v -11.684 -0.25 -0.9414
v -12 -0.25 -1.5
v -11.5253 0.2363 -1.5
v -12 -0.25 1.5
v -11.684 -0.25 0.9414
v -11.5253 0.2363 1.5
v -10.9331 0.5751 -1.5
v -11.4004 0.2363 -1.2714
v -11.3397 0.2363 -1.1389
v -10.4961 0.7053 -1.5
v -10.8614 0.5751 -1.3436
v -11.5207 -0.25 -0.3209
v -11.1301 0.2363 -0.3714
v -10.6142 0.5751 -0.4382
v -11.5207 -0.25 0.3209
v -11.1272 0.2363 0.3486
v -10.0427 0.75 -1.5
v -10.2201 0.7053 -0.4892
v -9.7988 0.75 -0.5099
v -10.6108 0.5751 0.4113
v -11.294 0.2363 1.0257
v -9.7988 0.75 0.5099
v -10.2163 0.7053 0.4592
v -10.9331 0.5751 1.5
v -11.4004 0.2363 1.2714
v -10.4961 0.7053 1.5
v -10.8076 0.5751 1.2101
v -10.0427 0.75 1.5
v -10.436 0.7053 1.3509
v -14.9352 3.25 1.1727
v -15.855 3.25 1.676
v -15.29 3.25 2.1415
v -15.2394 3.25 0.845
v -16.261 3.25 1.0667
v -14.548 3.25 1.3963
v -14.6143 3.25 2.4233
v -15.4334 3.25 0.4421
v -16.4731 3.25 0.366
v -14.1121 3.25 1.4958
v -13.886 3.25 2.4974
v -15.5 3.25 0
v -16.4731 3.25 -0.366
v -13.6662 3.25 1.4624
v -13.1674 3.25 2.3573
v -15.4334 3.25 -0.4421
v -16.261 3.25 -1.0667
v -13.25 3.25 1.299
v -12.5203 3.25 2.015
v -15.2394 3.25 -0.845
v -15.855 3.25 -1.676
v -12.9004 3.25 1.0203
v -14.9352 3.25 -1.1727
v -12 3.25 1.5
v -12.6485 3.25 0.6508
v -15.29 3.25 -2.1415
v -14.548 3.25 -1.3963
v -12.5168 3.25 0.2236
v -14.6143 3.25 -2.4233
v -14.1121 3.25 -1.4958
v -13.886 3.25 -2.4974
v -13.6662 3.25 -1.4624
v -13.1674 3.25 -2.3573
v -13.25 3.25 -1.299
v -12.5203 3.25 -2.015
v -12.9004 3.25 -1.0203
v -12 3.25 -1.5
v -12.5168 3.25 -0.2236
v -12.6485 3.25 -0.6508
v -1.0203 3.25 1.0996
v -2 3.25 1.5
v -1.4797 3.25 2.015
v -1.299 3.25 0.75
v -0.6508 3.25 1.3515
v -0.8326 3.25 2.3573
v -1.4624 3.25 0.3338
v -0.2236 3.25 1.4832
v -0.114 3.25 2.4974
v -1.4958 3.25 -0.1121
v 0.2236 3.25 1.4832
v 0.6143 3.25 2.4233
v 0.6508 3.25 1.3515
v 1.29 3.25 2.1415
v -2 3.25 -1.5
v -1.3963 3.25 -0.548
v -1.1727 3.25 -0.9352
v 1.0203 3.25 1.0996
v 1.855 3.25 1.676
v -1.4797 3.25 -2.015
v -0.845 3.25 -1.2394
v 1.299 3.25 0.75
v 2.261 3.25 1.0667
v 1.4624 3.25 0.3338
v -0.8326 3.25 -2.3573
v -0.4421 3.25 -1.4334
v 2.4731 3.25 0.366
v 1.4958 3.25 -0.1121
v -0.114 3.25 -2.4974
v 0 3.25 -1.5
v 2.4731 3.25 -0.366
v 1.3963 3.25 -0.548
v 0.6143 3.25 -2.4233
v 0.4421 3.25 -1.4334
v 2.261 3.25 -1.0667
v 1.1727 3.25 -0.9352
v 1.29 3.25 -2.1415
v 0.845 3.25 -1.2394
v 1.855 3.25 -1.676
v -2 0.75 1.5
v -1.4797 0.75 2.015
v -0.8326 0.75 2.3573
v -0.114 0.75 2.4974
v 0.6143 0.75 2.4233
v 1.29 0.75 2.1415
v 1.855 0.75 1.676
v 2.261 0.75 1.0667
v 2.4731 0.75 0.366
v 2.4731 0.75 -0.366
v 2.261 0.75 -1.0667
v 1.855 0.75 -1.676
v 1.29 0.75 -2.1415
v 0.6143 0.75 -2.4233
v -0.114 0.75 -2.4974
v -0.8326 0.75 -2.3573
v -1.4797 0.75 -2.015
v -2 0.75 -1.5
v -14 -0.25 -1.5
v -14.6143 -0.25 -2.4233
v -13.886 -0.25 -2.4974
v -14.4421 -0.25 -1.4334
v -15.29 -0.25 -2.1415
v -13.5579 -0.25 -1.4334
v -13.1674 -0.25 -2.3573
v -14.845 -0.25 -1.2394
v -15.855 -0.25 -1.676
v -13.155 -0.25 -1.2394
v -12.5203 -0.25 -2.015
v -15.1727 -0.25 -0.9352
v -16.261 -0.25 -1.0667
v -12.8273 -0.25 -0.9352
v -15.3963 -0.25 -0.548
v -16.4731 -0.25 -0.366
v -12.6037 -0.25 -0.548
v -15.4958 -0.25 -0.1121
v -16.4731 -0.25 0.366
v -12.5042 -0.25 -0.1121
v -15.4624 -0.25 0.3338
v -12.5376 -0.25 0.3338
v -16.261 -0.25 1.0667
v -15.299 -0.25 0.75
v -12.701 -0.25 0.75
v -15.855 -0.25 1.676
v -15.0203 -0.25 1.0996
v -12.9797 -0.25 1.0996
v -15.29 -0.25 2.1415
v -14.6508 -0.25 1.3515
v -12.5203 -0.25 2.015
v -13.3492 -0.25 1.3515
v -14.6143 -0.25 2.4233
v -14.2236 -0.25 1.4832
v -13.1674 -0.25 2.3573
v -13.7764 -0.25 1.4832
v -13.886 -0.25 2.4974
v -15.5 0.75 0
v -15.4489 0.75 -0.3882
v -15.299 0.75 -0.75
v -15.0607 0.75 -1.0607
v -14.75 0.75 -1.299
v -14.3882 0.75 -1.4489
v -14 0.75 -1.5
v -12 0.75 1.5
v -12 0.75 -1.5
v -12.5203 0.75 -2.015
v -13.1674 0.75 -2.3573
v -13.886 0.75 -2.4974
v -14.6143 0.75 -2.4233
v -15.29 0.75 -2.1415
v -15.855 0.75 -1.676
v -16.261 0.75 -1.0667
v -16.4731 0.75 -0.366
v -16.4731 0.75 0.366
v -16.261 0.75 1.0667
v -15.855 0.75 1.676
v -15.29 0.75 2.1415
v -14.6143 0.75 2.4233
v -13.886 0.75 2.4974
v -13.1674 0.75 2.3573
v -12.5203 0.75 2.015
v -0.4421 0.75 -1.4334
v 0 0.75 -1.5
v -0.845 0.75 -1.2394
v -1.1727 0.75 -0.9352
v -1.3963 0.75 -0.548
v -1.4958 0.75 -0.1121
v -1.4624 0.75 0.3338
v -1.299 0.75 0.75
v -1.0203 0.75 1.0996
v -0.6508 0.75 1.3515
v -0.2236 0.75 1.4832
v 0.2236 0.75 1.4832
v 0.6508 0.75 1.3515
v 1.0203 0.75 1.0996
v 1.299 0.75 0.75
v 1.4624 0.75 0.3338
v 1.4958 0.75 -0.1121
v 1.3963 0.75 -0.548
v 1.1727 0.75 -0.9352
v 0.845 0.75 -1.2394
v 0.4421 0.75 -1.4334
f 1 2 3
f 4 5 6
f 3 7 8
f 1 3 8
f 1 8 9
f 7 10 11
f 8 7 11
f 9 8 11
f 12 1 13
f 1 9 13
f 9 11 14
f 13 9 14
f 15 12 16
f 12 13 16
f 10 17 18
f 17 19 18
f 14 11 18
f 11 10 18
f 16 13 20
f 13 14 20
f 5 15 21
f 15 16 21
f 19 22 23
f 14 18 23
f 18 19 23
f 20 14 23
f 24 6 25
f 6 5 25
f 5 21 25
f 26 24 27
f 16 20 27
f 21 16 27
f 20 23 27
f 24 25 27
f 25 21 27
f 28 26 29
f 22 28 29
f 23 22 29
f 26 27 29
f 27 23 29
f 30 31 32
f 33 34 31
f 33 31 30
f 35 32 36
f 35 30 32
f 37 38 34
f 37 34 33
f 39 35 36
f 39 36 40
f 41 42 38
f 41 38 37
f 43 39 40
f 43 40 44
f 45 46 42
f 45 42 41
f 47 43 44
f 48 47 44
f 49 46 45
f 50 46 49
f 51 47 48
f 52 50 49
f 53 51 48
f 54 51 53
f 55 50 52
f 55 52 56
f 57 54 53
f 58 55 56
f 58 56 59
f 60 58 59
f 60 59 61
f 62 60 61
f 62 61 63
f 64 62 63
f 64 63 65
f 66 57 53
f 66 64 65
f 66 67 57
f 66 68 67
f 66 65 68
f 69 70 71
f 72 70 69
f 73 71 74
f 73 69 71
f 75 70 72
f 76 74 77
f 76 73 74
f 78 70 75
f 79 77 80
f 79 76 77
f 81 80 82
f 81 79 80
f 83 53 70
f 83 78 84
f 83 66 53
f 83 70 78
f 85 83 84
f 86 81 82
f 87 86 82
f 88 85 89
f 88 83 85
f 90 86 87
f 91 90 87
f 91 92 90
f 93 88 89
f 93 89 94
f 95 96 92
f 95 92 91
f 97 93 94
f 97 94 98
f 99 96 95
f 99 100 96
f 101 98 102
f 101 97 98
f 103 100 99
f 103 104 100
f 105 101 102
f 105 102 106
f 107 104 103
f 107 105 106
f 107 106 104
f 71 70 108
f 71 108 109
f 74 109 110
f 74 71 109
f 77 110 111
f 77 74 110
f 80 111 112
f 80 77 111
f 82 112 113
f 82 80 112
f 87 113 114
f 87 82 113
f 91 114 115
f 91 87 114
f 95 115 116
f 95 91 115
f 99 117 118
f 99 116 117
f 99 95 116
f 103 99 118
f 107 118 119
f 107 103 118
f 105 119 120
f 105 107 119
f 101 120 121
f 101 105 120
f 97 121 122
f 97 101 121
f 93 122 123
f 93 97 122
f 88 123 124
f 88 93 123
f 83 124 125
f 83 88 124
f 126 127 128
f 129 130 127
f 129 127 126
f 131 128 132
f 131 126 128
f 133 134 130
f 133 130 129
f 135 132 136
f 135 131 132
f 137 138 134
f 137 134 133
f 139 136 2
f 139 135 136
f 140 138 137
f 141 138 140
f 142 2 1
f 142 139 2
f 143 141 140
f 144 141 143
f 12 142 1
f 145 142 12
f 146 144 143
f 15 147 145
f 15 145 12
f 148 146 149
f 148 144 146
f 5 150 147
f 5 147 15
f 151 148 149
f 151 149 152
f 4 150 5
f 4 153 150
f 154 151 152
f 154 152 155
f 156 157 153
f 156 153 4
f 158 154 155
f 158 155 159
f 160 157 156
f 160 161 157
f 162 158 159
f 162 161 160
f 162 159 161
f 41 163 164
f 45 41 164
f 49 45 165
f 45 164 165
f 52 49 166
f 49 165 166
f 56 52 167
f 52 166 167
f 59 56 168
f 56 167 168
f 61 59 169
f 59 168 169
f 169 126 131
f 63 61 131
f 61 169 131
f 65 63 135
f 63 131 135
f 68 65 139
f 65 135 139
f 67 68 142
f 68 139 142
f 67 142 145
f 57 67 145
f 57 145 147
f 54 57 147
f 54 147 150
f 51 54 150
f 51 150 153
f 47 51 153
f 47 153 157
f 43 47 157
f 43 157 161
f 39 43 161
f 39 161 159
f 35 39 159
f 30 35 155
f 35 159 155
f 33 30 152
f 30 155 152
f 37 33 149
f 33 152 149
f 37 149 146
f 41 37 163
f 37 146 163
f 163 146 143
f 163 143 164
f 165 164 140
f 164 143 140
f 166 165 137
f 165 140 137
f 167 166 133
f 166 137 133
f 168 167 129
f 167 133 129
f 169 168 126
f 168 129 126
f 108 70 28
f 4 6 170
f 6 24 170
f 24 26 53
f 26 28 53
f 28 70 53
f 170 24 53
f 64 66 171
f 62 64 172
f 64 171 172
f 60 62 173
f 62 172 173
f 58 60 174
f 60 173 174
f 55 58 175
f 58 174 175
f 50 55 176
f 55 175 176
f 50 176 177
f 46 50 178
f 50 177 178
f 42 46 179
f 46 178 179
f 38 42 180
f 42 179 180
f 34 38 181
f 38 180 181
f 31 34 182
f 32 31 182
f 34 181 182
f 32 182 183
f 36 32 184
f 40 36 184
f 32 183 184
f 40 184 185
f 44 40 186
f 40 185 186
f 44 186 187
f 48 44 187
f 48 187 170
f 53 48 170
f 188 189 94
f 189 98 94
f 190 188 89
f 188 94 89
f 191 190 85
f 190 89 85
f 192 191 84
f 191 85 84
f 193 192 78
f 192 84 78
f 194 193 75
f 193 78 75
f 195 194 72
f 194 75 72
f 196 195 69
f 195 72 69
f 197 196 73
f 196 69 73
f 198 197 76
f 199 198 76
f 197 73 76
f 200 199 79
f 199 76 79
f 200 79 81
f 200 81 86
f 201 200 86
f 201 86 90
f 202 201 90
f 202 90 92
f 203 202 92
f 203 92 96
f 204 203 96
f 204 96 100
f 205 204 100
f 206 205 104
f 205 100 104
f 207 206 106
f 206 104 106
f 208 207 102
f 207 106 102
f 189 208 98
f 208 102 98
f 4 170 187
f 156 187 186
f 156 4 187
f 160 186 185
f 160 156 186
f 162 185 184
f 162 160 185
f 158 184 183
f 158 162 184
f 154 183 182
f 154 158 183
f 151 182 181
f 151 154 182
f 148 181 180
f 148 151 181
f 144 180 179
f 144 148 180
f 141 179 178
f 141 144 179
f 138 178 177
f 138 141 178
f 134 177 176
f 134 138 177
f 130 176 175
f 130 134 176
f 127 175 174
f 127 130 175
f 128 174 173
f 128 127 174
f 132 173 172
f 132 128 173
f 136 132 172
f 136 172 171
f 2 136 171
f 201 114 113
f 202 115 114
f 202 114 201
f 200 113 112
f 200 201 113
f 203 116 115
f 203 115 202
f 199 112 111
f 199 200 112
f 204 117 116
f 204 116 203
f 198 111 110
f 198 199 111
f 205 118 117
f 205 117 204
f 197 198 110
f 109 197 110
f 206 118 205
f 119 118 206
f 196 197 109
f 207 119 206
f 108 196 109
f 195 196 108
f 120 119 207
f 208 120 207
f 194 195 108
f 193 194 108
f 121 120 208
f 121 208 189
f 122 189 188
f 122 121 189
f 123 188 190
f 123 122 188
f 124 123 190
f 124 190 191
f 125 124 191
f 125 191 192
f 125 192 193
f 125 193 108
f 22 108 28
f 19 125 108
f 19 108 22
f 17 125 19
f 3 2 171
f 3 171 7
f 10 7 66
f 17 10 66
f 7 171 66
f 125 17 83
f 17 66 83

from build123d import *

# Parameters (mm, degrees)
BOSS_EXTRUDE1_DEPTH = 10
BOSS_EXTRUDE2_START = -10
SKETCH3_R           = 2.5
SKETCH3_R_2         = 2
BOSS_EXTRUDE2_DEPTH = 10
MOVE_FACE1_BY       = 5
SKETCH4_R           = 2.5
SKETCH4_R_2         = 1.5
BOSS_EXTRUDE3_DEPTH = 5
SKETCH5_R           = 1.5
CUT_EXTRUDE1_DEPTH  = 5
MOVE_FACE2_BY       = 1
SKETCH11_R          = 1.5
CUT_EXTRUDE2_DEPTH  = 0.75
SKETCH12_R          = 1.5
CUT_EXTRUDE3_DEPTH  = 0.75
FILLET1_R           = 1
SKETCH13_W          = 8
SKETCH13_H          = 3
CUT_EXTRUDE4_DEPTH  = 0.75
SKETCH14_W          = 8
SKETCH14_H          = 3
CUT_EXTRUDE5_DEPTH  = 0.75
BOSS_EXTRUDE6_START = 1
SKETCH16_R          = 2.5
SKETCH16_R_2        = 1.5
BOSS_EXTRUDE6_DEPTH = 1
FILLET3_R           = 2


with BuildPart() as part:
    # Sketch2 → Boss-Extrude1 (new body)
    with BuildSketch(Plane(origin=(0, 0, 0), x_dir=(1, 0, 0), z_dir=(0, 1, 0))):
        with BuildLine():
            Line((0, -1.5), (0, 0))
            Line((0, 0), (-12, 0))
            ThreePointArc((-12, 0), (-12.177124344, -0.822875656), (-12.677124344, -1.5))
            Line((-12.677124344, -1.5), (0, -1.5))
        make_face()
        with BuildLine():
            Line((-12, 0), (0, 0))
            Line((0, 0), (0, 1.5))
            Line((0, 1.5), (-12.677124344, 1.5))
            ThreePointArc((-12.677124344, 1.5), (-12.177124344, 0.822875656), (-12, 0))
        make_face()
        with BuildLine():
            ThreePointArc((-12.677124344, -1.5), (-12.177124344, -0.822875656), (-12, 0))
            Line((-12, 0), (-12.5, 0))
            ThreePointArc((-12.5, 0), (-12.544954729, -0.364476691), (-12.677124344, -0.707106781))
            Line((-12.677124344, -0.707106781), (-12.677124344, -1.5))
        make_face()
        with BuildLine():
            Line((-12.5, 0), (-12, 0))
            ThreePointArc((-12, 0), (-12.177124344, 0.822875656), (-12.677124344, 1.5))
            Line((-12.677124344, 1.5), (-12.677124344, 0.707106781))
            ThreePointArc((-12.677124344, 0.707106781), (-12.544954729, 0.364476691), (-12.5, 0))
        make_face()
        with BuildLine():
            Line((-12.677124344, 0.707106781), (-12.677124344, 1.5))
            ThreePointArc((-12.677124344, 1.5), (-13.292893219, 1.870828693), (-14, 2))
            Line((-14, 2), (-14, 1.5))
            ThreePointArc((-14, 1.5), (-13.228851562, 1.286596318), (-12.677124344, 0.707106781))
        make_face()
        with BuildLine():
            ThreePointArc((-14, -2), (-13.292893219, -1.870828693), (-12.677124344, -1.5))
            Line((-12.677124344, -1.5), (-12.677124344, -0.707106781))
            ThreePointArc((-12.677124344, -0.707106781), (-13.228851562, -1.286596318), (-14, -1.5))
            Line((-14, -1.5), (-14, -2))
        make_face()
        with BuildLine():
            Line((-14, 1.5), (-14, 2))
            ThreePointArc((-14, 2), (-15.414213562, 1.414213562), (-16, 0))
            Line((-16, 0), (-15.5, 0))
            ThreePointArc((-15.5, 0), (-15.060660172, 1.060660172), (-14, 1.5))
        make_face()
        with BuildLine():
            ThreePointArc((-16, 0), (-15.414213562, -1.414213562), (-14, -2))
            Line((-14, -2), (-14, -1.5))
            ThreePointArc((-14, -1.5), (-15.060660172, -1.060660172), (-15.5, 0))
            Line((-15.5, 0), (-16, 0))
        make_face()
    extrude(amount=BOSS_EXTRUDE1_DEPTH)

    # Sketch3 → Boss-Extrude2 (add)
    with BuildSketch(Plane(origin=(0, 10, 0), x_dir=(1, 0, 0), z_dir=(0, 1, 0)).offset(BOSS_EXTRUDE2_START)):
        with Locations((-14, 0)):
            Circle(SKETCH3_R)
        with Locations((-14, 0)):
            Circle(SKETCH3_R_2, mode=Mode.SUBTRACT)
    extrude(amount=BOSS_EXTRUDE2_DEPTH)

    # Move Face1: a face moved inward by 5.0
    extrude(part.faces().sort_by_distance((-7.989839666, 10, 0))[0], amount=MOVE_FACE1_BY, dir=(0, -1, 0), mode=Mode.SUBTRACT)

    # Sketch4 → Boss-Extrude3 (add)
    with BuildSketch(Plane(origin=(0, 5, 0), x_dir=(1, 0, 0), z_dir=(0, 1, 0))):
        Circle(SKETCH4_R)
        Circle(SKETCH4_R_2, mode=Mode.SUBTRACT)
    extrude(amount=-BOSS_EXTRUDE3_DEPTH)

    # Sketch5 → Cut-Extrude1 (cut)
    with BuildSketch(Plane(origin=(0, 5, 0), x_dir=(1, 0, 0), z_dir=(0, 1, 0))):
        with Locations(Location((0, 0, 0), (0, 0, 270))):
            Circle(SKETCH5_R)
    extrude(amount=-CUT_EXTRUDE1_DEPTH, mode=Mode.SUBTRACT)

    # Move Face2: a face moved inward by 1.0
    extrude(part.faces().sort_by_distance((-7, 5, 0))[0], amount=MOVE_FACE2_BY, dir=(0, -1, 0), mode=Mode.SUBTRACT)

    # Sketch11 → Cut-Extrude2 (cut)
    # profile 1 of 2: a face of its own
    with BuildSketch(Plane(origin=(0, 4, 0), x_dir=(1, 0, 0), z_dir=(0, 1, 0))):
        with BuildLine():
            Line((-11, 0), (-11, 1.5))
            Line((-11, 1.5), (-12, 1.5))
            ThreePointArc((-12, 1.5), (-16.5, 0), (-12, -1.5))
            Line((-12, -1.5), (-11, -1.5))
            Line((-11, -1.5), (-11, 0))
        make_face()
        with Locations(Location((-14, 0, 0), (0, 0, 270))):
            Circle(SKETCH11_R, mode=Mode.SUBTRACT)
    # profile 2 of 2: a face of its own
    with BuildSketch(Plane(origin=(0, 4, 0), x_dir=(1, 0, 0), z_dir=(0, 1, 0))):
        with BuildLine():
            Line((-2, 1.5), (-3, 1.5))
            Line((-3, 1.5), (-3, 0))
            Line((-3, 0), (-3, -1.5))
            Line((-3, -1.5), (-2, -1.5))
            ThreePointArc((-2, -1.5), (2.5, 0), (-2, 1.5))
        make_face()
        with Locations(Location((0, 0, 0), (0, 0, 270))):
            Circle(SKETCH11_R, mode=Mode.SUBTRACT)
    extrude(amount=-CUT_EXTRUDE2_DEPTH, mode=Mode.SUBTRACT)

    # Sketch12 → Cut-Extrude3 (cut)
    # profile 1 of 2: a face of its own
    with BuildSketch(Plane(origin=(0, 0, 0), x_dir=(-1, 0, 0), z_dir=(0, -1, 0))):
        with BuildLine():
            Line((11, 1.5), (11, -1.5))
            Line((11, -1.5), (12, -1.5))
            ThreePointArc((12, -1.5), (16.5, 0), (12, 1.5))
            Line((12, 1.5), (11, 1.5))
        make_face()
        with Locations(Location((14, 0, 0), (0, 0, 90))):
            Circle(SKETCH12_R, mode=Mode.SUBTRACT)
    # profile 2 of 2: a face of its own
    with BuildSketch(Plane(origin=(0, 0, 0), x_dir=(-1, 0, 0), z_dir=(0, -1, 0))):
        with BuildLine():
            Line((2, -1.5), (3, -1.5))
            Line((3, -1.5), (3, 1.5))
            Line((3, 1.5), (2, 1.5))
            ThreePointArc((2, 1.5), (-2.5, 0), (2, -1.5))
        make_face()
        with Locations(Location((0, 0, 0), (0, 0, 270))):
            Circle(SKETCH12_R, mode=Mode.SUBTRACT)
    extrude(amount=-CUT_EXTRUDE3_DEPTH, mode=Mode.SUBTRACT)

    # Fillet1
    # the kernel refuses this fillet: 1 mm, written as the material it takes off along each edge
    with BuildSketch(Plane(origin=(-3, 0, 3.920614591), x_dir=(0, 1, 0), z_dir=(0, 0, -1))) as fillet1_piece_1:
        with BuildLine():
            CenterArc((1, -0.968245837), FILLET1_R, 104.477512186, 75.522487814)
            Line((0, -0.968245837), (-0.02, -0.968245837))
            Line((-0.02, -0.968245837), (-0.02, 0))
            Line((-0.02, 0), (0, 0.02))
            ThreePointArc((0, 0.02), (0.375, 0.02), (0.745, 0.019364917))
            Line((0.745, 0.019364917), (0.75, 0))
        make_face()
    extrude(amount=7.841229183, mode=Mode.SUBTRACT)
    with BuildSketch(Plane(origin=(-3, 4, 3.920614591), x_dir=(-1, 0, 0), z_dir=(0, 0, -1))) as fillet1_piece_2:
        with BuildLine():
            CenterArc((0.968245837, -1), FILLET1_R, 90, 75.522487814)
            Line((0, -0.75), (-0.019364917, -0.745))
            ThreePointArc((-0.019364917, -0.745), (-0.02, -0.375), (-0.02, 0))
            Line((-0.02, 0), (0, 0.02))
            Line((0, 0.02), (0.968245837, 0.02))
            Line((0.968245837, 0.02), (0.968245837, 0))
        make_face()
    extrude(amount=7.841229183, mode=Mode.SUBTRACT)
    with BuildSketch(Plane(origin=(-11, 0, -3.920614591), x_dir=(1, 0, 0), z_dir=(0, 0, 1))) as fillet1_piece_3:
        with BuildLine():
            CenterArc((0.968245837, 1), FILLET1_R, 194.477512186, 75.522487814)
            Line((0, 0.75), (-0.019364917, 0.745))
            ThreePointArc((-0.019364917, 0.745), (-0.02, 0.375), (-0.02, 0))
            Line((-0.02, 0), (0, -0.02))
            Line((0, -0.02), (0.968245837, -0.02))
            Line((0.968245837, -0.02), (0.968245837, 0))
        make_face()
    extrude(amount=7.841229183, mode=Mode.SUBTRACT)
    with BuildSketch(Plane(origin=(-11, 4, -3.920614591), x_dir=(0, -1, 0), z_dir=(0, 0, 1))) as fillet1_piece_4:
        with BuildLine():
            CenterArc((1, 0.968245837), FILLET1_R, 180, 75.522487814)
            Line((0, 0.968245837), (-0.02, 0.968245837))
            Line((-0.02, 0.968245837), (-0.02, 0))
            Line((-0.02, 0), (0, -0.02))
            ThreePointArc((0, -0.02), (0.375, -0.02), (0.745, -0.019364917))
            Line((0.745, -0.019364917), (0.75, 0))
        make_face()
    extrude(amount=7.841229183, mode=Mode.SUBTRACT)

    # Sketch13 → Cut-Extrude4 (cut)
    with BuildSketch(Plane(origin=(0, 0, 0), x_dir=(-1, 0, 0), z_dir=(0, -1, 0))):
        with Locations((7, 0)):
            Rectangle(SKETCH13_W, SKETCH13_H)
    extrude(amount=-CUT_EXTRUDE4_DEPTH, mode=Mode.SUBTRACT)

    # Sketch14 → Cut-Extrude5 (cut)
    with BuildSketch(Plane(origin=(0, 4, 0), x_dir=(1, 0, 0), z_dir=(0, 1, 0))):
        with Locations((-7, 0)):
            Rectangle(SKETCH14_W, SKETCH14_H)
    extrude(amount=-CUT_EXTRUDE5_DEPTH, mode=Mode.SUBTRACT)

    # Sketch16 → Boss-Extrude6 (add)
    with BuildSketch(Plane(origin=(0, 0.75, 0), x_dir=(-1, 0, 0), z_dir=(0, -1, 0)).offset(BOSS_EXTRUDE6_START)):
        with Locations(Location((14, 0, 0), (0, 0, 216.869897646))):
            Circle(SKETCH16_R)
        with Locations(Location((14, 0, 0), (0, 0, 90))):
            Circle(SKETCH16_R_2, mode=Mode.SUBTRACT)
    extrude(amount=-BOSS_EXTRUDE6_DEPTH)

    # Fillet3
    # the kernel refuses this fillet: 2 mm, written as the material it adds along each edge
    with BuildSketch(Plane(origin=(-14, 0.75, 0), x_dir=(-0.720984929131136, 0, -0.6929507428134924), z_dir=(-0.6929507428134924, 0, 0.720984929131136))) as fillet3_piece_1_section:
        with BuildLine():
            CenterArc((4.232050808, 2), FILLET3_R, 210, 60)
            Line((4.232050808, 0), (4.232050808, -0.04))
            Line((4.232050808, -0.04), (2.5, -0.04))
            Line((2.5, -0.04), (2.46, 0))
            ThreePointArc((2.46, 0), (2.46, 0.5), (2.465358984, 0.98))
            Line((2.465358984, 0.98), (2.5, 1))
        make_face()
    fillet3_piece_1 = revolve(axis=Axis((-14, 0.75, 0), (0, -1, 0)), revolution_arc=272.27171598, mode=Mode.PRIVATE)
    fillet3_piece_1 = split(fillet3_piece_1, bisect_by=Plane(origin=(-11.214858776, 0.489042262, 1.5), z_dir=(0, 0, -1)), keep=Keep.TOP, mode=Mode.PRIVATE)
    fillet3_piece_1 = split(fillet3_piece_1, bisect_by=Plane(origin=(-11.214858776, 0.489042262, -1.5), z_dir=(0, 0, 1)), keep=Keep.TOP, mode=Mode.PRIVATE)
    add(fillet3_piece_1)


solid = part.part
